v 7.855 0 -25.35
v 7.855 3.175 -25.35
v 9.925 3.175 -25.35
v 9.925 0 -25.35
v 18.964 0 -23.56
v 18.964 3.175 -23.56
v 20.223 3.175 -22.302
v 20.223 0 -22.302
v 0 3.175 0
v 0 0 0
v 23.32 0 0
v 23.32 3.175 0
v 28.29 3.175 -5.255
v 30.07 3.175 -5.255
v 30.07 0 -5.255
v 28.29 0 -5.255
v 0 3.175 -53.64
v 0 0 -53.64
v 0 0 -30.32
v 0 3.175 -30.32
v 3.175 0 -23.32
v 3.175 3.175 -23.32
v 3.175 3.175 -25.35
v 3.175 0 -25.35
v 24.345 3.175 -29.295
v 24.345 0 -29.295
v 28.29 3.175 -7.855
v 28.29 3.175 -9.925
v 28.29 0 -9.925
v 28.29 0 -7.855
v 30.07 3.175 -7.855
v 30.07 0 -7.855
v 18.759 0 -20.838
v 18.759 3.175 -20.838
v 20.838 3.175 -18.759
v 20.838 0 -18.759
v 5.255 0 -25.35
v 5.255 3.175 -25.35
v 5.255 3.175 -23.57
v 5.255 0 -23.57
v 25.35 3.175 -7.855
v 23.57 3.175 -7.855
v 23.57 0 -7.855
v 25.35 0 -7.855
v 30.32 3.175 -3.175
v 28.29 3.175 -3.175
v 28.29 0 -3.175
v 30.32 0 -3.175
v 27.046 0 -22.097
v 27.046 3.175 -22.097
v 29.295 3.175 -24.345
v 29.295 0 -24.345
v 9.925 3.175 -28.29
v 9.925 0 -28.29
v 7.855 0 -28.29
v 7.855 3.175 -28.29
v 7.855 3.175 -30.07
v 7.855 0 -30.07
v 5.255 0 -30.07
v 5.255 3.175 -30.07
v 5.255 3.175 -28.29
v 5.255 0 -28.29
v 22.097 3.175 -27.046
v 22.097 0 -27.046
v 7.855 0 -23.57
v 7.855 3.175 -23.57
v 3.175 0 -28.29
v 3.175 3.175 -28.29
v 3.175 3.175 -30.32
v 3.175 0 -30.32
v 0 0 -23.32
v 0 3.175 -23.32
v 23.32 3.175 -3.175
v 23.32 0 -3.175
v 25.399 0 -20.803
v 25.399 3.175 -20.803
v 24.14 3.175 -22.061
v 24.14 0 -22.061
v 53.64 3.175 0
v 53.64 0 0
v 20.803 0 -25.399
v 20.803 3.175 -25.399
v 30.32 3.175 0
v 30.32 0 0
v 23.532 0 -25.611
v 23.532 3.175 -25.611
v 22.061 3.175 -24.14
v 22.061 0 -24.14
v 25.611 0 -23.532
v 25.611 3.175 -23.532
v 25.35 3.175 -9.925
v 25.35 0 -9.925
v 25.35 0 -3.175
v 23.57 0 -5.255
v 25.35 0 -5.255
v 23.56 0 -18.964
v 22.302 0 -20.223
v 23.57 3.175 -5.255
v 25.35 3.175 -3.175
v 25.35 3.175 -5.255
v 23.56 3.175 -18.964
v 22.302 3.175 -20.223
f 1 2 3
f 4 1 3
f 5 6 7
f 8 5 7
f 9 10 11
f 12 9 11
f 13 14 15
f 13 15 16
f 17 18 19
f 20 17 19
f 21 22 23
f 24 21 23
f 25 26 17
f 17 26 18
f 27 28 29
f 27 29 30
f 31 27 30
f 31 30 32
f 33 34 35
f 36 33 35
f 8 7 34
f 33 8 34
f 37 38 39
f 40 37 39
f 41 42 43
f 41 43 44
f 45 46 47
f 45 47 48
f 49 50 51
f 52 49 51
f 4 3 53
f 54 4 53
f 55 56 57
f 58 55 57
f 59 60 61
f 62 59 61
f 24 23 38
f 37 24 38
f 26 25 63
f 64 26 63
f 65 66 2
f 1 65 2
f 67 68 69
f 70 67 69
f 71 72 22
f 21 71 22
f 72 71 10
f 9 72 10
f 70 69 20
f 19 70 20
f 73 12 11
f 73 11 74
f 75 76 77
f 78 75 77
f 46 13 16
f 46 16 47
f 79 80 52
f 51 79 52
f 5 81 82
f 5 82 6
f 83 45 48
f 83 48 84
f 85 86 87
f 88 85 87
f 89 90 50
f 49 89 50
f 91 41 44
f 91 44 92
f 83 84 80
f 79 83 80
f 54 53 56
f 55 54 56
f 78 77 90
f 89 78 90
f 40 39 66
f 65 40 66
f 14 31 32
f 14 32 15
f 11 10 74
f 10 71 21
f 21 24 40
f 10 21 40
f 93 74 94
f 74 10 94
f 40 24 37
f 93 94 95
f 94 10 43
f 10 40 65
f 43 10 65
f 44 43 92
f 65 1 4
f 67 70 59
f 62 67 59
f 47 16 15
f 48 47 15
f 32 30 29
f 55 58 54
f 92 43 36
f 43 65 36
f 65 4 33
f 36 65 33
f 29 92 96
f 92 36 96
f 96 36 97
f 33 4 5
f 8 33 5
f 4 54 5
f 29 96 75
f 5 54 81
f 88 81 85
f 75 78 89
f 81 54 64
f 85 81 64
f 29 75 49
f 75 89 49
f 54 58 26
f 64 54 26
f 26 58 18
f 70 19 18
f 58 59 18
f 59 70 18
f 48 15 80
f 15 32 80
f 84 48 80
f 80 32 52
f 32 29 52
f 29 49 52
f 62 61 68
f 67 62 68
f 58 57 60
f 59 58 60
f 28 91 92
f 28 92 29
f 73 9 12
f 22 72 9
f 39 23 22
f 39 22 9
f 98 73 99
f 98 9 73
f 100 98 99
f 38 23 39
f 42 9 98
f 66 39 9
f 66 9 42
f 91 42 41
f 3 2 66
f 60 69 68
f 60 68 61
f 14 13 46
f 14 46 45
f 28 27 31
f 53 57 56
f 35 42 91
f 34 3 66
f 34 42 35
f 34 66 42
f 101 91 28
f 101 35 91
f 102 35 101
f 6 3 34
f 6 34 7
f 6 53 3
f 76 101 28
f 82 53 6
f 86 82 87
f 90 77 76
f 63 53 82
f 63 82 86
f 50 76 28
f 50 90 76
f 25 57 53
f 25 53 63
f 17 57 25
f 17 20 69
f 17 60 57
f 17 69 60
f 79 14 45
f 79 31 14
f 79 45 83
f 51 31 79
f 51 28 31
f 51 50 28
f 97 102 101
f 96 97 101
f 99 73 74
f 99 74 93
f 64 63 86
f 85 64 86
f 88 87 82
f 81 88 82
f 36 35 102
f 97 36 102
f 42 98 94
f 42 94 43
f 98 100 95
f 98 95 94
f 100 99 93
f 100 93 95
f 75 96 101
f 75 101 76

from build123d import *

# Parameters (mm, degrees)
BOSS_EXTRUDE1_DEPTH = 3.175
CUT_EXTRUDE1_DEPTH  = 10


with BuildPart() as part:
    # Sketch1 → Boss-Extrude1 (new body)
    with BuildSketch(Plane(origin=(0, 0, 0), x_dir=(1, 0, 0), z_dir=(0, 1, 0))):
        Polygon((0, 0), (53.64, 0), (0, 53.64), align=None)
    extrude(amount=BOSS_EXTRUDE1_DEPTH)

    # Sketch2 → Cut-Extrude1 (cut)
    with BuildSketch(Plane(origin=(0, 3.175, 0), x_dir=(1, 0, 0), z_dir=(0, 1, 0))):
        Polygon((27.04627417, 22.096526702), (29.294873734, 24.345126266), (24.345126266, 29.294873734), (22.096526702, 27.04627417), (23.531953467, 25.610847404), (22.061171363, 24.140065299), (20.802521292, 25.39871537), (18.964043661, 23.560237739), (20.222693732, 22.301587668), (18.758982694, 20.837876631), (20.837876631, 18.758982694), (22.301587668, 20.222693732), (23.560237739, 18.964043661), (25.39871537, 20.802521292), (24.140065299, 22.061171363), (25.610847404, 23.531953467), align=None)
        Polygon((3.175, 30.32), (0, 30.32), (0, 23.32), (3.175, 23.32), (3.175, 25.35), (5.255, 25.35), (5.255, 23.57), (7.855, 23.57), (7.855, 25.35), (9.925, 25.35), (9.925, 28.29), (7.855, 28.29), (7.855, 30.07), (5.255, 30.07), (5.255, 28.29), (3.175, 28.29), align=None)
        Polygon((30.32, 3.175), (30.32, 0), (23.32, 0), (23.32, 3.175), (25.35, 3.175), (25.35, 5.255), (23.57, 5.255), (23.57, 7.855), (25.35, 7.855), (25.35, 9.925), (28.29, 9.925), (28.29, 7.855), (30.07, 7.855), (30.07, 5.255), (28.29, 5.255), (28.29, 3.175), align=None)
    extrude(amount=-CUT_EXTRUDE1_DEPTH, mode=Mode.SUBTRACT)


solid = part.part
